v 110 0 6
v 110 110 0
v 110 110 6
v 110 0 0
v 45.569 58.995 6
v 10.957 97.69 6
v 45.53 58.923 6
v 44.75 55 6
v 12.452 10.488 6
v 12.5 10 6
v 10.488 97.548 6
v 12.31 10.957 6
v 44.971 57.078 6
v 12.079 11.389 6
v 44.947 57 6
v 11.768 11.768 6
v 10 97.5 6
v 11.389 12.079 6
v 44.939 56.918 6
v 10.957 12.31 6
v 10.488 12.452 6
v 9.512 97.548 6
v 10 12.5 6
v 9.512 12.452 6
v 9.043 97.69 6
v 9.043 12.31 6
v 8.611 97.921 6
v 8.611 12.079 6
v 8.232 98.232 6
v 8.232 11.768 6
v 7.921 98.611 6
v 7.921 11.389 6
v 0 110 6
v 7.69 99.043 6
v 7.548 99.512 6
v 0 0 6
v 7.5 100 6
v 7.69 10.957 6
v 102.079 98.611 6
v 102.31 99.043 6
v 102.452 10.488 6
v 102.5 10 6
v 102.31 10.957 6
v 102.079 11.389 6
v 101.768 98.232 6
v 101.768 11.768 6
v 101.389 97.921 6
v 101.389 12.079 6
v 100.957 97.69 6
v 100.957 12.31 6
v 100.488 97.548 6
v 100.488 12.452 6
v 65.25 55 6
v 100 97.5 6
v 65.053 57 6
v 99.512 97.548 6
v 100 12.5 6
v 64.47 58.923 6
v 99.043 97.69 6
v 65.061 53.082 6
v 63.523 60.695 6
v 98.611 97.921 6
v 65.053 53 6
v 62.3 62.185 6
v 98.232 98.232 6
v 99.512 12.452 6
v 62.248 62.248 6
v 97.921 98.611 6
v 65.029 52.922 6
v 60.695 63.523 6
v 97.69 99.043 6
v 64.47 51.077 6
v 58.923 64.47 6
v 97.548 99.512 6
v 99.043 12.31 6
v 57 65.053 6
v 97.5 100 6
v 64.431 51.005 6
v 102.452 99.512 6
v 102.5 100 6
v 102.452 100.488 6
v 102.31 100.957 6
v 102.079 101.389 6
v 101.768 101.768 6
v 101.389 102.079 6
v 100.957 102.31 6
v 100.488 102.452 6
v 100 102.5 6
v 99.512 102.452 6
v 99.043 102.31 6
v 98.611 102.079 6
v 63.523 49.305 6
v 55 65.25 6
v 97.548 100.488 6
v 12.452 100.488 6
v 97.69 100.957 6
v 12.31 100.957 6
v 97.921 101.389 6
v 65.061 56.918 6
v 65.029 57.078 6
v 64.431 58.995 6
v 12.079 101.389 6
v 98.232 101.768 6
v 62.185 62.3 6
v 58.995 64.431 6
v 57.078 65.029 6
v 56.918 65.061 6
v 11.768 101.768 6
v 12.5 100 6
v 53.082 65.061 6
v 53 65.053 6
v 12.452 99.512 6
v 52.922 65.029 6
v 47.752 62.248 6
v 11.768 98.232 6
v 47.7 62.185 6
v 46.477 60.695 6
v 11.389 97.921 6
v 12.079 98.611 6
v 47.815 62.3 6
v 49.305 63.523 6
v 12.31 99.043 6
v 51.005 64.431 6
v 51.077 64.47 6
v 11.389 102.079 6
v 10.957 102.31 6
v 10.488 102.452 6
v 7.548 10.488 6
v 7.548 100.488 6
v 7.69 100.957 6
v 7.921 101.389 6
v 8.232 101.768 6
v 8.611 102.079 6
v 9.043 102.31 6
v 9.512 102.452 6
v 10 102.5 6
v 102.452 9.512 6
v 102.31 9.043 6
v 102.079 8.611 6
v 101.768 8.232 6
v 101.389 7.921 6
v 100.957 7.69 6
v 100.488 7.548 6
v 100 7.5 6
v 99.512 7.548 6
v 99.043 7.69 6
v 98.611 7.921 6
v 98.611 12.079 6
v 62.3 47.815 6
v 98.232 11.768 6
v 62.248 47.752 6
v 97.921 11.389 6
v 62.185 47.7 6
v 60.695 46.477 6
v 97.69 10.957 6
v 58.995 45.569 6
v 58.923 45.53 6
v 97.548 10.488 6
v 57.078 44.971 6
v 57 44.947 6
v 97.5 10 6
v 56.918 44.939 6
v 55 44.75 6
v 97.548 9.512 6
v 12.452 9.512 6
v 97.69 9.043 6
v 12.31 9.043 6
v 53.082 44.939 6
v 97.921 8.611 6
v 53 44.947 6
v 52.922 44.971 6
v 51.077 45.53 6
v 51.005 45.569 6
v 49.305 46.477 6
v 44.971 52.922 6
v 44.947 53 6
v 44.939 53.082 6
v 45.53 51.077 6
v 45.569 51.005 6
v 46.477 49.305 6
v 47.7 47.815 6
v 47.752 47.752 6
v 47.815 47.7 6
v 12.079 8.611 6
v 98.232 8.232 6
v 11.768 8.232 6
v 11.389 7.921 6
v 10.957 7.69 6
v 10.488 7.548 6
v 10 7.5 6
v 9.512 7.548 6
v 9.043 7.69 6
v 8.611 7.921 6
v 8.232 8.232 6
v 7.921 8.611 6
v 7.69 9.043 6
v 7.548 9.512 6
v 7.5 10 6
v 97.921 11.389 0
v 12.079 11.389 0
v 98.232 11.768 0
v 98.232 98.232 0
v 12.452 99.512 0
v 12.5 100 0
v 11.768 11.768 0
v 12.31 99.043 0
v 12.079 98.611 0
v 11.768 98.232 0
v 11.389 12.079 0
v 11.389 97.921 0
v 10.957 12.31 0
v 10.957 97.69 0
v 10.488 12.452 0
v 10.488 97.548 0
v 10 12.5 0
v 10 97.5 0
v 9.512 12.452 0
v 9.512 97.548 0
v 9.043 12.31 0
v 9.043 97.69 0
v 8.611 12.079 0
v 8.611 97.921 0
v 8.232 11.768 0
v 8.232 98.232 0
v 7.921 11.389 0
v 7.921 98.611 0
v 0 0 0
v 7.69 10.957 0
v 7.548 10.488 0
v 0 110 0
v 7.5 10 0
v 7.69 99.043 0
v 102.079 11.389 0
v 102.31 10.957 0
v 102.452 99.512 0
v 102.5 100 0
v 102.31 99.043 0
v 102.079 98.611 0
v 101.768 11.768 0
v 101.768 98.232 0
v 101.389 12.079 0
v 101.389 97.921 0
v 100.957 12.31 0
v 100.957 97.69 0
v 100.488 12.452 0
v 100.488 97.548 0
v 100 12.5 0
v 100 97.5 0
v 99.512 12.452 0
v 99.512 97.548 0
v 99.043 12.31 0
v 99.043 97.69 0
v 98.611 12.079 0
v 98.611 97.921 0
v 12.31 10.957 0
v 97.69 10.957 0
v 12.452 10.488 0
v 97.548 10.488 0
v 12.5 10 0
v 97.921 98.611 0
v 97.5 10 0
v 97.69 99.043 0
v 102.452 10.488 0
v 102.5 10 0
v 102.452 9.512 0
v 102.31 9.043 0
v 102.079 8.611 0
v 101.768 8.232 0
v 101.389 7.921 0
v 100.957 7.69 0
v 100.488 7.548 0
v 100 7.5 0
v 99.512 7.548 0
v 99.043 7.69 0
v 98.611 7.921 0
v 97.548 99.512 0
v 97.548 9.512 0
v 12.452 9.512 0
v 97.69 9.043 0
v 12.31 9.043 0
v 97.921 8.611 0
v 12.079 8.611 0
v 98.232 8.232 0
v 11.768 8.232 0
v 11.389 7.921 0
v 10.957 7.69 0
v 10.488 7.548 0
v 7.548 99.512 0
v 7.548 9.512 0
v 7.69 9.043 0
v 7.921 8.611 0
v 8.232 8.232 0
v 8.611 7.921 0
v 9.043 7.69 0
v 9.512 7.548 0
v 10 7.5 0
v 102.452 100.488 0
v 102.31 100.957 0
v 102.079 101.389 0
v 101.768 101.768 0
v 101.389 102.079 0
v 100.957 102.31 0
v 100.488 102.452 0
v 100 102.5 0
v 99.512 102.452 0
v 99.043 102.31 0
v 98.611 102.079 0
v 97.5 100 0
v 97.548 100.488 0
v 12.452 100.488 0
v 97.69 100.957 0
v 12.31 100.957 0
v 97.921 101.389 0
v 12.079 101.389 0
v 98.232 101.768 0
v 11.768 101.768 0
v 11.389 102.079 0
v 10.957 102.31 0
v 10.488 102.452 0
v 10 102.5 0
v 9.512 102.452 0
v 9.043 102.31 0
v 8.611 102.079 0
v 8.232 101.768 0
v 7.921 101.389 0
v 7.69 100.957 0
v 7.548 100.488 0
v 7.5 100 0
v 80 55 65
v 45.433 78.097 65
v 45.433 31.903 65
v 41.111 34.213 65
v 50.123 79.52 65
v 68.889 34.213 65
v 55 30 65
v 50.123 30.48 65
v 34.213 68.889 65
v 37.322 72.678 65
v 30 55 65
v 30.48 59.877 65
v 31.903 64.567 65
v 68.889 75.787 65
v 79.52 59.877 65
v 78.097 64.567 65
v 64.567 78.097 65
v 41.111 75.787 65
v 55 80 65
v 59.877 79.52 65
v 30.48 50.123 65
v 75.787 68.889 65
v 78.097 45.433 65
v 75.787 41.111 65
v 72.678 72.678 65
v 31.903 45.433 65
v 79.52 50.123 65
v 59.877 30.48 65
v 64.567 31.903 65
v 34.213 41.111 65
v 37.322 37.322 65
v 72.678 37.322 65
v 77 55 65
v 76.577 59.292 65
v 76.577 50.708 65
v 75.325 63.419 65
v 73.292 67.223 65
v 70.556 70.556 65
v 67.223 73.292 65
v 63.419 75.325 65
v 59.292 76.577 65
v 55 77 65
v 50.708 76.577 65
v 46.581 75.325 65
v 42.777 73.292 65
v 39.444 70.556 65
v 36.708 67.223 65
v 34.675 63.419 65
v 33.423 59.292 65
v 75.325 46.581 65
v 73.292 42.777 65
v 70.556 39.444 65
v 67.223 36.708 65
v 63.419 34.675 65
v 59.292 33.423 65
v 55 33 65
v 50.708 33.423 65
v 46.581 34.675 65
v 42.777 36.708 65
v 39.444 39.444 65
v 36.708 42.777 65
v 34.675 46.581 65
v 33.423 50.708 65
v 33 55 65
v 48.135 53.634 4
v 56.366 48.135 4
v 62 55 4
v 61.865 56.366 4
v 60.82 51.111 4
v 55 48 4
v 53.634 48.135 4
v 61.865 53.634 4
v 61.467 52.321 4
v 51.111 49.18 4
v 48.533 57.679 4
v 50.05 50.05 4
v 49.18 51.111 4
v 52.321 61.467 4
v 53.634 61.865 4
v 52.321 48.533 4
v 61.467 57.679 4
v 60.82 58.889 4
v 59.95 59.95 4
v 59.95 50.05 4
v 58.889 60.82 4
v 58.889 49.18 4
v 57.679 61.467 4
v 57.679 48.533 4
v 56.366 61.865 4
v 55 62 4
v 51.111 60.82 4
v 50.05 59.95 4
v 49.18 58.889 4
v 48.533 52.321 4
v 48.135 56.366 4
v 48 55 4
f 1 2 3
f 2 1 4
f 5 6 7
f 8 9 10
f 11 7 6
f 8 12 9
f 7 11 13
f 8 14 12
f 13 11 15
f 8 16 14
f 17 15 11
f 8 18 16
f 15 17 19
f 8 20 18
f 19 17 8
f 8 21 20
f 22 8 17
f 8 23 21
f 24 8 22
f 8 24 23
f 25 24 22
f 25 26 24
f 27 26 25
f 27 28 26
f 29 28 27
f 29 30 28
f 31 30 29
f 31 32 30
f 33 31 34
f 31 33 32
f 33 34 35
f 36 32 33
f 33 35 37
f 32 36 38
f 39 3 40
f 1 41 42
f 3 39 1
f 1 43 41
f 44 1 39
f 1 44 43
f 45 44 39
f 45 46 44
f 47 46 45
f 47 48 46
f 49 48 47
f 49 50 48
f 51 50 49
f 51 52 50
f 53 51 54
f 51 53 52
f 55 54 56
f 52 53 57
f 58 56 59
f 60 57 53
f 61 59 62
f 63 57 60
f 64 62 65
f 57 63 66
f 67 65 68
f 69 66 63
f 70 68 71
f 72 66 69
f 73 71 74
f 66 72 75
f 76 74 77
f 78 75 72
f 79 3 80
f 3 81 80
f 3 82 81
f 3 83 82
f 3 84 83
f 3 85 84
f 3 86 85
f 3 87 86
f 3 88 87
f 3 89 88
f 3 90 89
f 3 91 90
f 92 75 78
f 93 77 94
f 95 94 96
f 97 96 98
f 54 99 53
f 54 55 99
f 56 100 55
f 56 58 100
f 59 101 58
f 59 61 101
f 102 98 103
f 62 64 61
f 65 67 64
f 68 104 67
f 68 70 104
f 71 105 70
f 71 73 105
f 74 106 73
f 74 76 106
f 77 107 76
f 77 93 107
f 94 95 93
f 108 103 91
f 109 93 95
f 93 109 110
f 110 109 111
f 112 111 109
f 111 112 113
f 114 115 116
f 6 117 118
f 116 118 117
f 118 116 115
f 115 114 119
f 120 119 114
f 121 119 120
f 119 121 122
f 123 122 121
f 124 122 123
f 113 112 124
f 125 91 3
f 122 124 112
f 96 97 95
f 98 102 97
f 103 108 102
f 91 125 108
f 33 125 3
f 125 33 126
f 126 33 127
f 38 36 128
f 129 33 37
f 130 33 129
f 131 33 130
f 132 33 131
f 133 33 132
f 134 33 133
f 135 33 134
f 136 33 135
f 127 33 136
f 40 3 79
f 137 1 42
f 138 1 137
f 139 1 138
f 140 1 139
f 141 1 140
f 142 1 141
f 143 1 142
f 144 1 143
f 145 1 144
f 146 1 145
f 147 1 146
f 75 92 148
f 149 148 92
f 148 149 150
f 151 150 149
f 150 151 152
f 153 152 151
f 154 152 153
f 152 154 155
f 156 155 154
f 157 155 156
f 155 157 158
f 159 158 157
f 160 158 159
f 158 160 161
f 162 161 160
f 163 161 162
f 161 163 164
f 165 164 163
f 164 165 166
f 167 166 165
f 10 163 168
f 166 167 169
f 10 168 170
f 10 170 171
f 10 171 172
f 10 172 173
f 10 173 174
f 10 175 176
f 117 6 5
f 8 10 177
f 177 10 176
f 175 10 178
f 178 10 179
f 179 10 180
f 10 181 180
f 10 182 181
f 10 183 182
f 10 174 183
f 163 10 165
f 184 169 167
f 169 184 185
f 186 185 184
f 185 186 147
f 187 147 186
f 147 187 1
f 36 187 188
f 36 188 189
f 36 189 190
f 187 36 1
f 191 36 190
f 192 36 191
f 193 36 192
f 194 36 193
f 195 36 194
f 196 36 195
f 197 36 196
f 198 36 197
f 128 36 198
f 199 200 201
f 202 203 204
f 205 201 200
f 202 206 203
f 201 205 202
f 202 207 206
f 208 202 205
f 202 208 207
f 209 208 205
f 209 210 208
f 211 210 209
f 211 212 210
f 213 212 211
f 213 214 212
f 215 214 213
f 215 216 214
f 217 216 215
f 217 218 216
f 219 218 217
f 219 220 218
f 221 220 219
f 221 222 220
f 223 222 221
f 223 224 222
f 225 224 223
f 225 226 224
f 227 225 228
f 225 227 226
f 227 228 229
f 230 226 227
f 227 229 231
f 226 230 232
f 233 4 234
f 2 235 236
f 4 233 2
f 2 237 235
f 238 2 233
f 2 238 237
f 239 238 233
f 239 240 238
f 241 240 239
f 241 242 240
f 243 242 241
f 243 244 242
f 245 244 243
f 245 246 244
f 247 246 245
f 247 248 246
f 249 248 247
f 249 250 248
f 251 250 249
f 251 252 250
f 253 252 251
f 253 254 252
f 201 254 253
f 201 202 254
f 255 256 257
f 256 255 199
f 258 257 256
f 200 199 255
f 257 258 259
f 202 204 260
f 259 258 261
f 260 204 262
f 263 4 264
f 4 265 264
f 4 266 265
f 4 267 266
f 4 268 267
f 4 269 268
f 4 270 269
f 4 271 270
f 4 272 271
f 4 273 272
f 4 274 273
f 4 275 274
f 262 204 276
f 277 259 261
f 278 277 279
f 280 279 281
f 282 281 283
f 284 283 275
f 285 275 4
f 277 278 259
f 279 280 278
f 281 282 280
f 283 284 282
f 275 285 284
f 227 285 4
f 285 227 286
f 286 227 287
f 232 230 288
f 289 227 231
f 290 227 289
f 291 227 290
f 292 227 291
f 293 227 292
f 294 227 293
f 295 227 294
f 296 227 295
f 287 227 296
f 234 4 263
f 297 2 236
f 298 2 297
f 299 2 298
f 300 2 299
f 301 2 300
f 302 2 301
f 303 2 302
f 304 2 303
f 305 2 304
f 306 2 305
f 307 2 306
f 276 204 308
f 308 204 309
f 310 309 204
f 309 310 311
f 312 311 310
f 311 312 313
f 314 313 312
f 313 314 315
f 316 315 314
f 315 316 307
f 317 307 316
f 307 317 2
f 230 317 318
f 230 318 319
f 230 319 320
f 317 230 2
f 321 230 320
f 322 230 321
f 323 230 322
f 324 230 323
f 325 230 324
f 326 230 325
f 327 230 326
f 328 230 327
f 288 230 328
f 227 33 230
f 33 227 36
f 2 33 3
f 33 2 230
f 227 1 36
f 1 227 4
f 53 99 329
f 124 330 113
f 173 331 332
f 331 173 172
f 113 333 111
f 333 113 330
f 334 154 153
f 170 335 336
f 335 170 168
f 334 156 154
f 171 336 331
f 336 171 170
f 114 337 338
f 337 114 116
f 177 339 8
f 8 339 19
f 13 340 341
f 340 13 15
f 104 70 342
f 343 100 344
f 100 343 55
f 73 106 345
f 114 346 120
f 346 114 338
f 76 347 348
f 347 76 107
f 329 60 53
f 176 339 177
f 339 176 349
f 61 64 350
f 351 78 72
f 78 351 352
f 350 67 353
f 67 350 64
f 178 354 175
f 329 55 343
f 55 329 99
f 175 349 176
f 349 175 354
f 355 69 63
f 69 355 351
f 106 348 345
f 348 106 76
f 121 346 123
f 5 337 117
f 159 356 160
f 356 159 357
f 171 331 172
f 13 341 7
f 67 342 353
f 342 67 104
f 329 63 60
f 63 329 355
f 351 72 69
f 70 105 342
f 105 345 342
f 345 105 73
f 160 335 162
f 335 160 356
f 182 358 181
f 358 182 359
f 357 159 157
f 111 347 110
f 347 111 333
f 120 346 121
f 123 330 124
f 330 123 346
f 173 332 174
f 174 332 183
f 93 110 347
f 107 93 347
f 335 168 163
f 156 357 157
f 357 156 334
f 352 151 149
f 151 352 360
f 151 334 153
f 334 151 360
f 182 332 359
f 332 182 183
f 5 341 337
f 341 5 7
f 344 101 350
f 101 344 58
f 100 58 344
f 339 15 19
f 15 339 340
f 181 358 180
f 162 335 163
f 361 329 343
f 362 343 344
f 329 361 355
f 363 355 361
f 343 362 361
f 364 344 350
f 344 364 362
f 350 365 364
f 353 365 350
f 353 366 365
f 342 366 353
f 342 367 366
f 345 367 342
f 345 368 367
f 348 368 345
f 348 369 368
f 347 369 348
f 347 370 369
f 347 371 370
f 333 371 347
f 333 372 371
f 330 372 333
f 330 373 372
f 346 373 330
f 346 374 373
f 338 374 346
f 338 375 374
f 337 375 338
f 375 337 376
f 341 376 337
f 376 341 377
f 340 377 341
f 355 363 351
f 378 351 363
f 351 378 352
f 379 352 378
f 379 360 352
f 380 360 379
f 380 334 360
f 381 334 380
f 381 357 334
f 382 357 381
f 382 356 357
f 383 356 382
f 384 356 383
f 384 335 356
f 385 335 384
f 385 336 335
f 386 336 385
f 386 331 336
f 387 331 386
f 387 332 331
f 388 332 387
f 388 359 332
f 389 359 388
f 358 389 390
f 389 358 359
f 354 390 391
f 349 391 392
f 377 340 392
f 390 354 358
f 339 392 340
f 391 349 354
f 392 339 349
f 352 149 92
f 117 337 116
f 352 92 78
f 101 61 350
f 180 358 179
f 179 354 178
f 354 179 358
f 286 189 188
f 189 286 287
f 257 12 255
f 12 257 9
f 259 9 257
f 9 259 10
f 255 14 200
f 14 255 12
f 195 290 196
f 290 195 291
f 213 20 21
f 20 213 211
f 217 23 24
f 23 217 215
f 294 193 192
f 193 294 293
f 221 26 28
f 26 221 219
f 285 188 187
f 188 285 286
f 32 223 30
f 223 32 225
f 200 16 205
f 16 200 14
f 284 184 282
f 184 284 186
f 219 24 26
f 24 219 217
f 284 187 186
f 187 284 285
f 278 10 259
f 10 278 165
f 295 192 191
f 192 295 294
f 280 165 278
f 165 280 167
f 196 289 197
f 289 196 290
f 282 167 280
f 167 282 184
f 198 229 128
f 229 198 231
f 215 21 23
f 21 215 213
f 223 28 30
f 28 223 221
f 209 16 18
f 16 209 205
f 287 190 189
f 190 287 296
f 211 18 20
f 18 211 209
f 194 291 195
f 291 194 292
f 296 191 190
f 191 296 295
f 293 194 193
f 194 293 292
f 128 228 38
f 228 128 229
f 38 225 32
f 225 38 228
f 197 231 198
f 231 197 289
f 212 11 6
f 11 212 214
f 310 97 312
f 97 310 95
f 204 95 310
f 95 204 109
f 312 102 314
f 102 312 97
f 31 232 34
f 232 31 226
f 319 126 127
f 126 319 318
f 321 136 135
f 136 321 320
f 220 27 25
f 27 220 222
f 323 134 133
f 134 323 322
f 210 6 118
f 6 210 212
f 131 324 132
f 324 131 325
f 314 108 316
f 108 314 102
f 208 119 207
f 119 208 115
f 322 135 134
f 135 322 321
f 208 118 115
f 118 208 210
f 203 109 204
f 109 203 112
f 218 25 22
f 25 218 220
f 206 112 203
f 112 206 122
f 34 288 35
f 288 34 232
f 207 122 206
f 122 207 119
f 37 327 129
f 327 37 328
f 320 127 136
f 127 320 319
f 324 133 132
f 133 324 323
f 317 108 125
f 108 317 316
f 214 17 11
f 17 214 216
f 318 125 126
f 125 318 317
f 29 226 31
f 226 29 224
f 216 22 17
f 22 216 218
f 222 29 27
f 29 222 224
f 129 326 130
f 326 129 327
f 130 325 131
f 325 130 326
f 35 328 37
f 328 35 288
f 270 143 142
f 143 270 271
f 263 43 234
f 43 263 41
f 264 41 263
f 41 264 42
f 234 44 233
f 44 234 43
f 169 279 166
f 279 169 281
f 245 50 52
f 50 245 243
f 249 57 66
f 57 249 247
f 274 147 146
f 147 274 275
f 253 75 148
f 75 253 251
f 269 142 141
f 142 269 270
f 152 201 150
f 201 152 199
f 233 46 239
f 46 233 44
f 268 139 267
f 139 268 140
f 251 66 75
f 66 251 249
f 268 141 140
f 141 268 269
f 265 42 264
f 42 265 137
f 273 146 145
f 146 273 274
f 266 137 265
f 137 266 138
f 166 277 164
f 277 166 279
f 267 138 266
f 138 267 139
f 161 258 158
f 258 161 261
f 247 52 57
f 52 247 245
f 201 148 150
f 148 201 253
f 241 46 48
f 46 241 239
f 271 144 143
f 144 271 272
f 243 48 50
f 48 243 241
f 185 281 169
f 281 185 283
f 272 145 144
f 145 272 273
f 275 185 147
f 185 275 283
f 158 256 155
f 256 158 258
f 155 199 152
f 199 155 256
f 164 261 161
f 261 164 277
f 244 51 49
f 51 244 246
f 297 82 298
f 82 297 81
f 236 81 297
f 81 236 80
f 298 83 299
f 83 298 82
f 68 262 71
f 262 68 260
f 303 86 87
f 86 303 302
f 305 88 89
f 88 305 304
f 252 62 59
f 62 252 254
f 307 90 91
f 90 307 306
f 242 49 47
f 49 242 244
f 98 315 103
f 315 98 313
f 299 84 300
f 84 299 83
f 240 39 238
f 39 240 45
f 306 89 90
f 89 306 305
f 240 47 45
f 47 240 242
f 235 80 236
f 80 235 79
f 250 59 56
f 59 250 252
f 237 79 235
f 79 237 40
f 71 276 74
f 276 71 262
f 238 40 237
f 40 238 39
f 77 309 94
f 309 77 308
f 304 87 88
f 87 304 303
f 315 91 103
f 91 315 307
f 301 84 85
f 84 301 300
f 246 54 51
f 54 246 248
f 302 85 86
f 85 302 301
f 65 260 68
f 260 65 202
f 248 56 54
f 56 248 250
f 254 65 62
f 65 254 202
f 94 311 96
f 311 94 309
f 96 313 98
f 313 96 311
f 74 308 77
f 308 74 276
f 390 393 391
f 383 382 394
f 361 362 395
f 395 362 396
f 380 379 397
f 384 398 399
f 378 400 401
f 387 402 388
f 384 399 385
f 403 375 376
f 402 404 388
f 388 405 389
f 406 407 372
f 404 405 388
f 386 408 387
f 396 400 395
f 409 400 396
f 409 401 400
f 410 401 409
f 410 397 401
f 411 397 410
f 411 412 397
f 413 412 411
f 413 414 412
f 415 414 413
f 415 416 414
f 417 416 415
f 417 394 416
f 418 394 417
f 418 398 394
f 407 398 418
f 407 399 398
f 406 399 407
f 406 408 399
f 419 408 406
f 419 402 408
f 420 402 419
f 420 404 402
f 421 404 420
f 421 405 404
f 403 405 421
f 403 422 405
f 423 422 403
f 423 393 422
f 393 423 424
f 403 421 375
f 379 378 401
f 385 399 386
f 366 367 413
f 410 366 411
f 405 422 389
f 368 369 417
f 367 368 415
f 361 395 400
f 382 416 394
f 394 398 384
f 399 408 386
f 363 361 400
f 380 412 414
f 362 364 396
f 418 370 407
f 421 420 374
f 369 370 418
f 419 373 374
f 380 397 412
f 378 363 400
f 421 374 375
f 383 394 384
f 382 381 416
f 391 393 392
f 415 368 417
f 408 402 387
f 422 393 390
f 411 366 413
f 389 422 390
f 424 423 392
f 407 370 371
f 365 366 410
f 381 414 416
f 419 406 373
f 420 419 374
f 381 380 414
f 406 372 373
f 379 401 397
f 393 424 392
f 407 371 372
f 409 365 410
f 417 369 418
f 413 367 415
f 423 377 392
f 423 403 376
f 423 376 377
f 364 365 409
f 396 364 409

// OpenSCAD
$fn = 32;

// ----------------------------------------------------------------------
// Hopper: flanged with square flange
// ----------------------------------------------------------------------

// --- parameters (mm) ---
fl = 110;                 // flange side, X and Y
fl_t = 6;                 // flange thickness
cone_h = 60;              // cone height above the flange
top_d = 50;               // cone mouth diameter
bot_d = 20;               // cone spout diameter
wall = 3;                 // cone wall thickness
hole_r = 2.5;             // flange hole radius
hole_in = 10;             // hole inset from the corners

bore_d = bot_d - 2 * wall;  // spout bore diameter
total_h = fl_t + cone_h - 1;  // overall height

difference() {
  union() {
    cube([fl, fl, fl_t]);
    translate([fl / 2, fl / 2, fl_t - 1])
      cylinder(h = cone_h, d1 = bot_d, d2 = top_d);
  }
  translate([fl / 2, fl / 2, fl_t - 2])
    cylinder(h = cone_h + 1, d1 = bore_d, d2 = top_d - 2 * wall);
  for (sx = [0, 1], sy = [0, 1])
    translate([sx ? fl - hole_in : hole_in,
               sy ? fl - hole_in : hole_in, -1])
      cylinder(r = hole_r, h = fl_t + 2);
}
